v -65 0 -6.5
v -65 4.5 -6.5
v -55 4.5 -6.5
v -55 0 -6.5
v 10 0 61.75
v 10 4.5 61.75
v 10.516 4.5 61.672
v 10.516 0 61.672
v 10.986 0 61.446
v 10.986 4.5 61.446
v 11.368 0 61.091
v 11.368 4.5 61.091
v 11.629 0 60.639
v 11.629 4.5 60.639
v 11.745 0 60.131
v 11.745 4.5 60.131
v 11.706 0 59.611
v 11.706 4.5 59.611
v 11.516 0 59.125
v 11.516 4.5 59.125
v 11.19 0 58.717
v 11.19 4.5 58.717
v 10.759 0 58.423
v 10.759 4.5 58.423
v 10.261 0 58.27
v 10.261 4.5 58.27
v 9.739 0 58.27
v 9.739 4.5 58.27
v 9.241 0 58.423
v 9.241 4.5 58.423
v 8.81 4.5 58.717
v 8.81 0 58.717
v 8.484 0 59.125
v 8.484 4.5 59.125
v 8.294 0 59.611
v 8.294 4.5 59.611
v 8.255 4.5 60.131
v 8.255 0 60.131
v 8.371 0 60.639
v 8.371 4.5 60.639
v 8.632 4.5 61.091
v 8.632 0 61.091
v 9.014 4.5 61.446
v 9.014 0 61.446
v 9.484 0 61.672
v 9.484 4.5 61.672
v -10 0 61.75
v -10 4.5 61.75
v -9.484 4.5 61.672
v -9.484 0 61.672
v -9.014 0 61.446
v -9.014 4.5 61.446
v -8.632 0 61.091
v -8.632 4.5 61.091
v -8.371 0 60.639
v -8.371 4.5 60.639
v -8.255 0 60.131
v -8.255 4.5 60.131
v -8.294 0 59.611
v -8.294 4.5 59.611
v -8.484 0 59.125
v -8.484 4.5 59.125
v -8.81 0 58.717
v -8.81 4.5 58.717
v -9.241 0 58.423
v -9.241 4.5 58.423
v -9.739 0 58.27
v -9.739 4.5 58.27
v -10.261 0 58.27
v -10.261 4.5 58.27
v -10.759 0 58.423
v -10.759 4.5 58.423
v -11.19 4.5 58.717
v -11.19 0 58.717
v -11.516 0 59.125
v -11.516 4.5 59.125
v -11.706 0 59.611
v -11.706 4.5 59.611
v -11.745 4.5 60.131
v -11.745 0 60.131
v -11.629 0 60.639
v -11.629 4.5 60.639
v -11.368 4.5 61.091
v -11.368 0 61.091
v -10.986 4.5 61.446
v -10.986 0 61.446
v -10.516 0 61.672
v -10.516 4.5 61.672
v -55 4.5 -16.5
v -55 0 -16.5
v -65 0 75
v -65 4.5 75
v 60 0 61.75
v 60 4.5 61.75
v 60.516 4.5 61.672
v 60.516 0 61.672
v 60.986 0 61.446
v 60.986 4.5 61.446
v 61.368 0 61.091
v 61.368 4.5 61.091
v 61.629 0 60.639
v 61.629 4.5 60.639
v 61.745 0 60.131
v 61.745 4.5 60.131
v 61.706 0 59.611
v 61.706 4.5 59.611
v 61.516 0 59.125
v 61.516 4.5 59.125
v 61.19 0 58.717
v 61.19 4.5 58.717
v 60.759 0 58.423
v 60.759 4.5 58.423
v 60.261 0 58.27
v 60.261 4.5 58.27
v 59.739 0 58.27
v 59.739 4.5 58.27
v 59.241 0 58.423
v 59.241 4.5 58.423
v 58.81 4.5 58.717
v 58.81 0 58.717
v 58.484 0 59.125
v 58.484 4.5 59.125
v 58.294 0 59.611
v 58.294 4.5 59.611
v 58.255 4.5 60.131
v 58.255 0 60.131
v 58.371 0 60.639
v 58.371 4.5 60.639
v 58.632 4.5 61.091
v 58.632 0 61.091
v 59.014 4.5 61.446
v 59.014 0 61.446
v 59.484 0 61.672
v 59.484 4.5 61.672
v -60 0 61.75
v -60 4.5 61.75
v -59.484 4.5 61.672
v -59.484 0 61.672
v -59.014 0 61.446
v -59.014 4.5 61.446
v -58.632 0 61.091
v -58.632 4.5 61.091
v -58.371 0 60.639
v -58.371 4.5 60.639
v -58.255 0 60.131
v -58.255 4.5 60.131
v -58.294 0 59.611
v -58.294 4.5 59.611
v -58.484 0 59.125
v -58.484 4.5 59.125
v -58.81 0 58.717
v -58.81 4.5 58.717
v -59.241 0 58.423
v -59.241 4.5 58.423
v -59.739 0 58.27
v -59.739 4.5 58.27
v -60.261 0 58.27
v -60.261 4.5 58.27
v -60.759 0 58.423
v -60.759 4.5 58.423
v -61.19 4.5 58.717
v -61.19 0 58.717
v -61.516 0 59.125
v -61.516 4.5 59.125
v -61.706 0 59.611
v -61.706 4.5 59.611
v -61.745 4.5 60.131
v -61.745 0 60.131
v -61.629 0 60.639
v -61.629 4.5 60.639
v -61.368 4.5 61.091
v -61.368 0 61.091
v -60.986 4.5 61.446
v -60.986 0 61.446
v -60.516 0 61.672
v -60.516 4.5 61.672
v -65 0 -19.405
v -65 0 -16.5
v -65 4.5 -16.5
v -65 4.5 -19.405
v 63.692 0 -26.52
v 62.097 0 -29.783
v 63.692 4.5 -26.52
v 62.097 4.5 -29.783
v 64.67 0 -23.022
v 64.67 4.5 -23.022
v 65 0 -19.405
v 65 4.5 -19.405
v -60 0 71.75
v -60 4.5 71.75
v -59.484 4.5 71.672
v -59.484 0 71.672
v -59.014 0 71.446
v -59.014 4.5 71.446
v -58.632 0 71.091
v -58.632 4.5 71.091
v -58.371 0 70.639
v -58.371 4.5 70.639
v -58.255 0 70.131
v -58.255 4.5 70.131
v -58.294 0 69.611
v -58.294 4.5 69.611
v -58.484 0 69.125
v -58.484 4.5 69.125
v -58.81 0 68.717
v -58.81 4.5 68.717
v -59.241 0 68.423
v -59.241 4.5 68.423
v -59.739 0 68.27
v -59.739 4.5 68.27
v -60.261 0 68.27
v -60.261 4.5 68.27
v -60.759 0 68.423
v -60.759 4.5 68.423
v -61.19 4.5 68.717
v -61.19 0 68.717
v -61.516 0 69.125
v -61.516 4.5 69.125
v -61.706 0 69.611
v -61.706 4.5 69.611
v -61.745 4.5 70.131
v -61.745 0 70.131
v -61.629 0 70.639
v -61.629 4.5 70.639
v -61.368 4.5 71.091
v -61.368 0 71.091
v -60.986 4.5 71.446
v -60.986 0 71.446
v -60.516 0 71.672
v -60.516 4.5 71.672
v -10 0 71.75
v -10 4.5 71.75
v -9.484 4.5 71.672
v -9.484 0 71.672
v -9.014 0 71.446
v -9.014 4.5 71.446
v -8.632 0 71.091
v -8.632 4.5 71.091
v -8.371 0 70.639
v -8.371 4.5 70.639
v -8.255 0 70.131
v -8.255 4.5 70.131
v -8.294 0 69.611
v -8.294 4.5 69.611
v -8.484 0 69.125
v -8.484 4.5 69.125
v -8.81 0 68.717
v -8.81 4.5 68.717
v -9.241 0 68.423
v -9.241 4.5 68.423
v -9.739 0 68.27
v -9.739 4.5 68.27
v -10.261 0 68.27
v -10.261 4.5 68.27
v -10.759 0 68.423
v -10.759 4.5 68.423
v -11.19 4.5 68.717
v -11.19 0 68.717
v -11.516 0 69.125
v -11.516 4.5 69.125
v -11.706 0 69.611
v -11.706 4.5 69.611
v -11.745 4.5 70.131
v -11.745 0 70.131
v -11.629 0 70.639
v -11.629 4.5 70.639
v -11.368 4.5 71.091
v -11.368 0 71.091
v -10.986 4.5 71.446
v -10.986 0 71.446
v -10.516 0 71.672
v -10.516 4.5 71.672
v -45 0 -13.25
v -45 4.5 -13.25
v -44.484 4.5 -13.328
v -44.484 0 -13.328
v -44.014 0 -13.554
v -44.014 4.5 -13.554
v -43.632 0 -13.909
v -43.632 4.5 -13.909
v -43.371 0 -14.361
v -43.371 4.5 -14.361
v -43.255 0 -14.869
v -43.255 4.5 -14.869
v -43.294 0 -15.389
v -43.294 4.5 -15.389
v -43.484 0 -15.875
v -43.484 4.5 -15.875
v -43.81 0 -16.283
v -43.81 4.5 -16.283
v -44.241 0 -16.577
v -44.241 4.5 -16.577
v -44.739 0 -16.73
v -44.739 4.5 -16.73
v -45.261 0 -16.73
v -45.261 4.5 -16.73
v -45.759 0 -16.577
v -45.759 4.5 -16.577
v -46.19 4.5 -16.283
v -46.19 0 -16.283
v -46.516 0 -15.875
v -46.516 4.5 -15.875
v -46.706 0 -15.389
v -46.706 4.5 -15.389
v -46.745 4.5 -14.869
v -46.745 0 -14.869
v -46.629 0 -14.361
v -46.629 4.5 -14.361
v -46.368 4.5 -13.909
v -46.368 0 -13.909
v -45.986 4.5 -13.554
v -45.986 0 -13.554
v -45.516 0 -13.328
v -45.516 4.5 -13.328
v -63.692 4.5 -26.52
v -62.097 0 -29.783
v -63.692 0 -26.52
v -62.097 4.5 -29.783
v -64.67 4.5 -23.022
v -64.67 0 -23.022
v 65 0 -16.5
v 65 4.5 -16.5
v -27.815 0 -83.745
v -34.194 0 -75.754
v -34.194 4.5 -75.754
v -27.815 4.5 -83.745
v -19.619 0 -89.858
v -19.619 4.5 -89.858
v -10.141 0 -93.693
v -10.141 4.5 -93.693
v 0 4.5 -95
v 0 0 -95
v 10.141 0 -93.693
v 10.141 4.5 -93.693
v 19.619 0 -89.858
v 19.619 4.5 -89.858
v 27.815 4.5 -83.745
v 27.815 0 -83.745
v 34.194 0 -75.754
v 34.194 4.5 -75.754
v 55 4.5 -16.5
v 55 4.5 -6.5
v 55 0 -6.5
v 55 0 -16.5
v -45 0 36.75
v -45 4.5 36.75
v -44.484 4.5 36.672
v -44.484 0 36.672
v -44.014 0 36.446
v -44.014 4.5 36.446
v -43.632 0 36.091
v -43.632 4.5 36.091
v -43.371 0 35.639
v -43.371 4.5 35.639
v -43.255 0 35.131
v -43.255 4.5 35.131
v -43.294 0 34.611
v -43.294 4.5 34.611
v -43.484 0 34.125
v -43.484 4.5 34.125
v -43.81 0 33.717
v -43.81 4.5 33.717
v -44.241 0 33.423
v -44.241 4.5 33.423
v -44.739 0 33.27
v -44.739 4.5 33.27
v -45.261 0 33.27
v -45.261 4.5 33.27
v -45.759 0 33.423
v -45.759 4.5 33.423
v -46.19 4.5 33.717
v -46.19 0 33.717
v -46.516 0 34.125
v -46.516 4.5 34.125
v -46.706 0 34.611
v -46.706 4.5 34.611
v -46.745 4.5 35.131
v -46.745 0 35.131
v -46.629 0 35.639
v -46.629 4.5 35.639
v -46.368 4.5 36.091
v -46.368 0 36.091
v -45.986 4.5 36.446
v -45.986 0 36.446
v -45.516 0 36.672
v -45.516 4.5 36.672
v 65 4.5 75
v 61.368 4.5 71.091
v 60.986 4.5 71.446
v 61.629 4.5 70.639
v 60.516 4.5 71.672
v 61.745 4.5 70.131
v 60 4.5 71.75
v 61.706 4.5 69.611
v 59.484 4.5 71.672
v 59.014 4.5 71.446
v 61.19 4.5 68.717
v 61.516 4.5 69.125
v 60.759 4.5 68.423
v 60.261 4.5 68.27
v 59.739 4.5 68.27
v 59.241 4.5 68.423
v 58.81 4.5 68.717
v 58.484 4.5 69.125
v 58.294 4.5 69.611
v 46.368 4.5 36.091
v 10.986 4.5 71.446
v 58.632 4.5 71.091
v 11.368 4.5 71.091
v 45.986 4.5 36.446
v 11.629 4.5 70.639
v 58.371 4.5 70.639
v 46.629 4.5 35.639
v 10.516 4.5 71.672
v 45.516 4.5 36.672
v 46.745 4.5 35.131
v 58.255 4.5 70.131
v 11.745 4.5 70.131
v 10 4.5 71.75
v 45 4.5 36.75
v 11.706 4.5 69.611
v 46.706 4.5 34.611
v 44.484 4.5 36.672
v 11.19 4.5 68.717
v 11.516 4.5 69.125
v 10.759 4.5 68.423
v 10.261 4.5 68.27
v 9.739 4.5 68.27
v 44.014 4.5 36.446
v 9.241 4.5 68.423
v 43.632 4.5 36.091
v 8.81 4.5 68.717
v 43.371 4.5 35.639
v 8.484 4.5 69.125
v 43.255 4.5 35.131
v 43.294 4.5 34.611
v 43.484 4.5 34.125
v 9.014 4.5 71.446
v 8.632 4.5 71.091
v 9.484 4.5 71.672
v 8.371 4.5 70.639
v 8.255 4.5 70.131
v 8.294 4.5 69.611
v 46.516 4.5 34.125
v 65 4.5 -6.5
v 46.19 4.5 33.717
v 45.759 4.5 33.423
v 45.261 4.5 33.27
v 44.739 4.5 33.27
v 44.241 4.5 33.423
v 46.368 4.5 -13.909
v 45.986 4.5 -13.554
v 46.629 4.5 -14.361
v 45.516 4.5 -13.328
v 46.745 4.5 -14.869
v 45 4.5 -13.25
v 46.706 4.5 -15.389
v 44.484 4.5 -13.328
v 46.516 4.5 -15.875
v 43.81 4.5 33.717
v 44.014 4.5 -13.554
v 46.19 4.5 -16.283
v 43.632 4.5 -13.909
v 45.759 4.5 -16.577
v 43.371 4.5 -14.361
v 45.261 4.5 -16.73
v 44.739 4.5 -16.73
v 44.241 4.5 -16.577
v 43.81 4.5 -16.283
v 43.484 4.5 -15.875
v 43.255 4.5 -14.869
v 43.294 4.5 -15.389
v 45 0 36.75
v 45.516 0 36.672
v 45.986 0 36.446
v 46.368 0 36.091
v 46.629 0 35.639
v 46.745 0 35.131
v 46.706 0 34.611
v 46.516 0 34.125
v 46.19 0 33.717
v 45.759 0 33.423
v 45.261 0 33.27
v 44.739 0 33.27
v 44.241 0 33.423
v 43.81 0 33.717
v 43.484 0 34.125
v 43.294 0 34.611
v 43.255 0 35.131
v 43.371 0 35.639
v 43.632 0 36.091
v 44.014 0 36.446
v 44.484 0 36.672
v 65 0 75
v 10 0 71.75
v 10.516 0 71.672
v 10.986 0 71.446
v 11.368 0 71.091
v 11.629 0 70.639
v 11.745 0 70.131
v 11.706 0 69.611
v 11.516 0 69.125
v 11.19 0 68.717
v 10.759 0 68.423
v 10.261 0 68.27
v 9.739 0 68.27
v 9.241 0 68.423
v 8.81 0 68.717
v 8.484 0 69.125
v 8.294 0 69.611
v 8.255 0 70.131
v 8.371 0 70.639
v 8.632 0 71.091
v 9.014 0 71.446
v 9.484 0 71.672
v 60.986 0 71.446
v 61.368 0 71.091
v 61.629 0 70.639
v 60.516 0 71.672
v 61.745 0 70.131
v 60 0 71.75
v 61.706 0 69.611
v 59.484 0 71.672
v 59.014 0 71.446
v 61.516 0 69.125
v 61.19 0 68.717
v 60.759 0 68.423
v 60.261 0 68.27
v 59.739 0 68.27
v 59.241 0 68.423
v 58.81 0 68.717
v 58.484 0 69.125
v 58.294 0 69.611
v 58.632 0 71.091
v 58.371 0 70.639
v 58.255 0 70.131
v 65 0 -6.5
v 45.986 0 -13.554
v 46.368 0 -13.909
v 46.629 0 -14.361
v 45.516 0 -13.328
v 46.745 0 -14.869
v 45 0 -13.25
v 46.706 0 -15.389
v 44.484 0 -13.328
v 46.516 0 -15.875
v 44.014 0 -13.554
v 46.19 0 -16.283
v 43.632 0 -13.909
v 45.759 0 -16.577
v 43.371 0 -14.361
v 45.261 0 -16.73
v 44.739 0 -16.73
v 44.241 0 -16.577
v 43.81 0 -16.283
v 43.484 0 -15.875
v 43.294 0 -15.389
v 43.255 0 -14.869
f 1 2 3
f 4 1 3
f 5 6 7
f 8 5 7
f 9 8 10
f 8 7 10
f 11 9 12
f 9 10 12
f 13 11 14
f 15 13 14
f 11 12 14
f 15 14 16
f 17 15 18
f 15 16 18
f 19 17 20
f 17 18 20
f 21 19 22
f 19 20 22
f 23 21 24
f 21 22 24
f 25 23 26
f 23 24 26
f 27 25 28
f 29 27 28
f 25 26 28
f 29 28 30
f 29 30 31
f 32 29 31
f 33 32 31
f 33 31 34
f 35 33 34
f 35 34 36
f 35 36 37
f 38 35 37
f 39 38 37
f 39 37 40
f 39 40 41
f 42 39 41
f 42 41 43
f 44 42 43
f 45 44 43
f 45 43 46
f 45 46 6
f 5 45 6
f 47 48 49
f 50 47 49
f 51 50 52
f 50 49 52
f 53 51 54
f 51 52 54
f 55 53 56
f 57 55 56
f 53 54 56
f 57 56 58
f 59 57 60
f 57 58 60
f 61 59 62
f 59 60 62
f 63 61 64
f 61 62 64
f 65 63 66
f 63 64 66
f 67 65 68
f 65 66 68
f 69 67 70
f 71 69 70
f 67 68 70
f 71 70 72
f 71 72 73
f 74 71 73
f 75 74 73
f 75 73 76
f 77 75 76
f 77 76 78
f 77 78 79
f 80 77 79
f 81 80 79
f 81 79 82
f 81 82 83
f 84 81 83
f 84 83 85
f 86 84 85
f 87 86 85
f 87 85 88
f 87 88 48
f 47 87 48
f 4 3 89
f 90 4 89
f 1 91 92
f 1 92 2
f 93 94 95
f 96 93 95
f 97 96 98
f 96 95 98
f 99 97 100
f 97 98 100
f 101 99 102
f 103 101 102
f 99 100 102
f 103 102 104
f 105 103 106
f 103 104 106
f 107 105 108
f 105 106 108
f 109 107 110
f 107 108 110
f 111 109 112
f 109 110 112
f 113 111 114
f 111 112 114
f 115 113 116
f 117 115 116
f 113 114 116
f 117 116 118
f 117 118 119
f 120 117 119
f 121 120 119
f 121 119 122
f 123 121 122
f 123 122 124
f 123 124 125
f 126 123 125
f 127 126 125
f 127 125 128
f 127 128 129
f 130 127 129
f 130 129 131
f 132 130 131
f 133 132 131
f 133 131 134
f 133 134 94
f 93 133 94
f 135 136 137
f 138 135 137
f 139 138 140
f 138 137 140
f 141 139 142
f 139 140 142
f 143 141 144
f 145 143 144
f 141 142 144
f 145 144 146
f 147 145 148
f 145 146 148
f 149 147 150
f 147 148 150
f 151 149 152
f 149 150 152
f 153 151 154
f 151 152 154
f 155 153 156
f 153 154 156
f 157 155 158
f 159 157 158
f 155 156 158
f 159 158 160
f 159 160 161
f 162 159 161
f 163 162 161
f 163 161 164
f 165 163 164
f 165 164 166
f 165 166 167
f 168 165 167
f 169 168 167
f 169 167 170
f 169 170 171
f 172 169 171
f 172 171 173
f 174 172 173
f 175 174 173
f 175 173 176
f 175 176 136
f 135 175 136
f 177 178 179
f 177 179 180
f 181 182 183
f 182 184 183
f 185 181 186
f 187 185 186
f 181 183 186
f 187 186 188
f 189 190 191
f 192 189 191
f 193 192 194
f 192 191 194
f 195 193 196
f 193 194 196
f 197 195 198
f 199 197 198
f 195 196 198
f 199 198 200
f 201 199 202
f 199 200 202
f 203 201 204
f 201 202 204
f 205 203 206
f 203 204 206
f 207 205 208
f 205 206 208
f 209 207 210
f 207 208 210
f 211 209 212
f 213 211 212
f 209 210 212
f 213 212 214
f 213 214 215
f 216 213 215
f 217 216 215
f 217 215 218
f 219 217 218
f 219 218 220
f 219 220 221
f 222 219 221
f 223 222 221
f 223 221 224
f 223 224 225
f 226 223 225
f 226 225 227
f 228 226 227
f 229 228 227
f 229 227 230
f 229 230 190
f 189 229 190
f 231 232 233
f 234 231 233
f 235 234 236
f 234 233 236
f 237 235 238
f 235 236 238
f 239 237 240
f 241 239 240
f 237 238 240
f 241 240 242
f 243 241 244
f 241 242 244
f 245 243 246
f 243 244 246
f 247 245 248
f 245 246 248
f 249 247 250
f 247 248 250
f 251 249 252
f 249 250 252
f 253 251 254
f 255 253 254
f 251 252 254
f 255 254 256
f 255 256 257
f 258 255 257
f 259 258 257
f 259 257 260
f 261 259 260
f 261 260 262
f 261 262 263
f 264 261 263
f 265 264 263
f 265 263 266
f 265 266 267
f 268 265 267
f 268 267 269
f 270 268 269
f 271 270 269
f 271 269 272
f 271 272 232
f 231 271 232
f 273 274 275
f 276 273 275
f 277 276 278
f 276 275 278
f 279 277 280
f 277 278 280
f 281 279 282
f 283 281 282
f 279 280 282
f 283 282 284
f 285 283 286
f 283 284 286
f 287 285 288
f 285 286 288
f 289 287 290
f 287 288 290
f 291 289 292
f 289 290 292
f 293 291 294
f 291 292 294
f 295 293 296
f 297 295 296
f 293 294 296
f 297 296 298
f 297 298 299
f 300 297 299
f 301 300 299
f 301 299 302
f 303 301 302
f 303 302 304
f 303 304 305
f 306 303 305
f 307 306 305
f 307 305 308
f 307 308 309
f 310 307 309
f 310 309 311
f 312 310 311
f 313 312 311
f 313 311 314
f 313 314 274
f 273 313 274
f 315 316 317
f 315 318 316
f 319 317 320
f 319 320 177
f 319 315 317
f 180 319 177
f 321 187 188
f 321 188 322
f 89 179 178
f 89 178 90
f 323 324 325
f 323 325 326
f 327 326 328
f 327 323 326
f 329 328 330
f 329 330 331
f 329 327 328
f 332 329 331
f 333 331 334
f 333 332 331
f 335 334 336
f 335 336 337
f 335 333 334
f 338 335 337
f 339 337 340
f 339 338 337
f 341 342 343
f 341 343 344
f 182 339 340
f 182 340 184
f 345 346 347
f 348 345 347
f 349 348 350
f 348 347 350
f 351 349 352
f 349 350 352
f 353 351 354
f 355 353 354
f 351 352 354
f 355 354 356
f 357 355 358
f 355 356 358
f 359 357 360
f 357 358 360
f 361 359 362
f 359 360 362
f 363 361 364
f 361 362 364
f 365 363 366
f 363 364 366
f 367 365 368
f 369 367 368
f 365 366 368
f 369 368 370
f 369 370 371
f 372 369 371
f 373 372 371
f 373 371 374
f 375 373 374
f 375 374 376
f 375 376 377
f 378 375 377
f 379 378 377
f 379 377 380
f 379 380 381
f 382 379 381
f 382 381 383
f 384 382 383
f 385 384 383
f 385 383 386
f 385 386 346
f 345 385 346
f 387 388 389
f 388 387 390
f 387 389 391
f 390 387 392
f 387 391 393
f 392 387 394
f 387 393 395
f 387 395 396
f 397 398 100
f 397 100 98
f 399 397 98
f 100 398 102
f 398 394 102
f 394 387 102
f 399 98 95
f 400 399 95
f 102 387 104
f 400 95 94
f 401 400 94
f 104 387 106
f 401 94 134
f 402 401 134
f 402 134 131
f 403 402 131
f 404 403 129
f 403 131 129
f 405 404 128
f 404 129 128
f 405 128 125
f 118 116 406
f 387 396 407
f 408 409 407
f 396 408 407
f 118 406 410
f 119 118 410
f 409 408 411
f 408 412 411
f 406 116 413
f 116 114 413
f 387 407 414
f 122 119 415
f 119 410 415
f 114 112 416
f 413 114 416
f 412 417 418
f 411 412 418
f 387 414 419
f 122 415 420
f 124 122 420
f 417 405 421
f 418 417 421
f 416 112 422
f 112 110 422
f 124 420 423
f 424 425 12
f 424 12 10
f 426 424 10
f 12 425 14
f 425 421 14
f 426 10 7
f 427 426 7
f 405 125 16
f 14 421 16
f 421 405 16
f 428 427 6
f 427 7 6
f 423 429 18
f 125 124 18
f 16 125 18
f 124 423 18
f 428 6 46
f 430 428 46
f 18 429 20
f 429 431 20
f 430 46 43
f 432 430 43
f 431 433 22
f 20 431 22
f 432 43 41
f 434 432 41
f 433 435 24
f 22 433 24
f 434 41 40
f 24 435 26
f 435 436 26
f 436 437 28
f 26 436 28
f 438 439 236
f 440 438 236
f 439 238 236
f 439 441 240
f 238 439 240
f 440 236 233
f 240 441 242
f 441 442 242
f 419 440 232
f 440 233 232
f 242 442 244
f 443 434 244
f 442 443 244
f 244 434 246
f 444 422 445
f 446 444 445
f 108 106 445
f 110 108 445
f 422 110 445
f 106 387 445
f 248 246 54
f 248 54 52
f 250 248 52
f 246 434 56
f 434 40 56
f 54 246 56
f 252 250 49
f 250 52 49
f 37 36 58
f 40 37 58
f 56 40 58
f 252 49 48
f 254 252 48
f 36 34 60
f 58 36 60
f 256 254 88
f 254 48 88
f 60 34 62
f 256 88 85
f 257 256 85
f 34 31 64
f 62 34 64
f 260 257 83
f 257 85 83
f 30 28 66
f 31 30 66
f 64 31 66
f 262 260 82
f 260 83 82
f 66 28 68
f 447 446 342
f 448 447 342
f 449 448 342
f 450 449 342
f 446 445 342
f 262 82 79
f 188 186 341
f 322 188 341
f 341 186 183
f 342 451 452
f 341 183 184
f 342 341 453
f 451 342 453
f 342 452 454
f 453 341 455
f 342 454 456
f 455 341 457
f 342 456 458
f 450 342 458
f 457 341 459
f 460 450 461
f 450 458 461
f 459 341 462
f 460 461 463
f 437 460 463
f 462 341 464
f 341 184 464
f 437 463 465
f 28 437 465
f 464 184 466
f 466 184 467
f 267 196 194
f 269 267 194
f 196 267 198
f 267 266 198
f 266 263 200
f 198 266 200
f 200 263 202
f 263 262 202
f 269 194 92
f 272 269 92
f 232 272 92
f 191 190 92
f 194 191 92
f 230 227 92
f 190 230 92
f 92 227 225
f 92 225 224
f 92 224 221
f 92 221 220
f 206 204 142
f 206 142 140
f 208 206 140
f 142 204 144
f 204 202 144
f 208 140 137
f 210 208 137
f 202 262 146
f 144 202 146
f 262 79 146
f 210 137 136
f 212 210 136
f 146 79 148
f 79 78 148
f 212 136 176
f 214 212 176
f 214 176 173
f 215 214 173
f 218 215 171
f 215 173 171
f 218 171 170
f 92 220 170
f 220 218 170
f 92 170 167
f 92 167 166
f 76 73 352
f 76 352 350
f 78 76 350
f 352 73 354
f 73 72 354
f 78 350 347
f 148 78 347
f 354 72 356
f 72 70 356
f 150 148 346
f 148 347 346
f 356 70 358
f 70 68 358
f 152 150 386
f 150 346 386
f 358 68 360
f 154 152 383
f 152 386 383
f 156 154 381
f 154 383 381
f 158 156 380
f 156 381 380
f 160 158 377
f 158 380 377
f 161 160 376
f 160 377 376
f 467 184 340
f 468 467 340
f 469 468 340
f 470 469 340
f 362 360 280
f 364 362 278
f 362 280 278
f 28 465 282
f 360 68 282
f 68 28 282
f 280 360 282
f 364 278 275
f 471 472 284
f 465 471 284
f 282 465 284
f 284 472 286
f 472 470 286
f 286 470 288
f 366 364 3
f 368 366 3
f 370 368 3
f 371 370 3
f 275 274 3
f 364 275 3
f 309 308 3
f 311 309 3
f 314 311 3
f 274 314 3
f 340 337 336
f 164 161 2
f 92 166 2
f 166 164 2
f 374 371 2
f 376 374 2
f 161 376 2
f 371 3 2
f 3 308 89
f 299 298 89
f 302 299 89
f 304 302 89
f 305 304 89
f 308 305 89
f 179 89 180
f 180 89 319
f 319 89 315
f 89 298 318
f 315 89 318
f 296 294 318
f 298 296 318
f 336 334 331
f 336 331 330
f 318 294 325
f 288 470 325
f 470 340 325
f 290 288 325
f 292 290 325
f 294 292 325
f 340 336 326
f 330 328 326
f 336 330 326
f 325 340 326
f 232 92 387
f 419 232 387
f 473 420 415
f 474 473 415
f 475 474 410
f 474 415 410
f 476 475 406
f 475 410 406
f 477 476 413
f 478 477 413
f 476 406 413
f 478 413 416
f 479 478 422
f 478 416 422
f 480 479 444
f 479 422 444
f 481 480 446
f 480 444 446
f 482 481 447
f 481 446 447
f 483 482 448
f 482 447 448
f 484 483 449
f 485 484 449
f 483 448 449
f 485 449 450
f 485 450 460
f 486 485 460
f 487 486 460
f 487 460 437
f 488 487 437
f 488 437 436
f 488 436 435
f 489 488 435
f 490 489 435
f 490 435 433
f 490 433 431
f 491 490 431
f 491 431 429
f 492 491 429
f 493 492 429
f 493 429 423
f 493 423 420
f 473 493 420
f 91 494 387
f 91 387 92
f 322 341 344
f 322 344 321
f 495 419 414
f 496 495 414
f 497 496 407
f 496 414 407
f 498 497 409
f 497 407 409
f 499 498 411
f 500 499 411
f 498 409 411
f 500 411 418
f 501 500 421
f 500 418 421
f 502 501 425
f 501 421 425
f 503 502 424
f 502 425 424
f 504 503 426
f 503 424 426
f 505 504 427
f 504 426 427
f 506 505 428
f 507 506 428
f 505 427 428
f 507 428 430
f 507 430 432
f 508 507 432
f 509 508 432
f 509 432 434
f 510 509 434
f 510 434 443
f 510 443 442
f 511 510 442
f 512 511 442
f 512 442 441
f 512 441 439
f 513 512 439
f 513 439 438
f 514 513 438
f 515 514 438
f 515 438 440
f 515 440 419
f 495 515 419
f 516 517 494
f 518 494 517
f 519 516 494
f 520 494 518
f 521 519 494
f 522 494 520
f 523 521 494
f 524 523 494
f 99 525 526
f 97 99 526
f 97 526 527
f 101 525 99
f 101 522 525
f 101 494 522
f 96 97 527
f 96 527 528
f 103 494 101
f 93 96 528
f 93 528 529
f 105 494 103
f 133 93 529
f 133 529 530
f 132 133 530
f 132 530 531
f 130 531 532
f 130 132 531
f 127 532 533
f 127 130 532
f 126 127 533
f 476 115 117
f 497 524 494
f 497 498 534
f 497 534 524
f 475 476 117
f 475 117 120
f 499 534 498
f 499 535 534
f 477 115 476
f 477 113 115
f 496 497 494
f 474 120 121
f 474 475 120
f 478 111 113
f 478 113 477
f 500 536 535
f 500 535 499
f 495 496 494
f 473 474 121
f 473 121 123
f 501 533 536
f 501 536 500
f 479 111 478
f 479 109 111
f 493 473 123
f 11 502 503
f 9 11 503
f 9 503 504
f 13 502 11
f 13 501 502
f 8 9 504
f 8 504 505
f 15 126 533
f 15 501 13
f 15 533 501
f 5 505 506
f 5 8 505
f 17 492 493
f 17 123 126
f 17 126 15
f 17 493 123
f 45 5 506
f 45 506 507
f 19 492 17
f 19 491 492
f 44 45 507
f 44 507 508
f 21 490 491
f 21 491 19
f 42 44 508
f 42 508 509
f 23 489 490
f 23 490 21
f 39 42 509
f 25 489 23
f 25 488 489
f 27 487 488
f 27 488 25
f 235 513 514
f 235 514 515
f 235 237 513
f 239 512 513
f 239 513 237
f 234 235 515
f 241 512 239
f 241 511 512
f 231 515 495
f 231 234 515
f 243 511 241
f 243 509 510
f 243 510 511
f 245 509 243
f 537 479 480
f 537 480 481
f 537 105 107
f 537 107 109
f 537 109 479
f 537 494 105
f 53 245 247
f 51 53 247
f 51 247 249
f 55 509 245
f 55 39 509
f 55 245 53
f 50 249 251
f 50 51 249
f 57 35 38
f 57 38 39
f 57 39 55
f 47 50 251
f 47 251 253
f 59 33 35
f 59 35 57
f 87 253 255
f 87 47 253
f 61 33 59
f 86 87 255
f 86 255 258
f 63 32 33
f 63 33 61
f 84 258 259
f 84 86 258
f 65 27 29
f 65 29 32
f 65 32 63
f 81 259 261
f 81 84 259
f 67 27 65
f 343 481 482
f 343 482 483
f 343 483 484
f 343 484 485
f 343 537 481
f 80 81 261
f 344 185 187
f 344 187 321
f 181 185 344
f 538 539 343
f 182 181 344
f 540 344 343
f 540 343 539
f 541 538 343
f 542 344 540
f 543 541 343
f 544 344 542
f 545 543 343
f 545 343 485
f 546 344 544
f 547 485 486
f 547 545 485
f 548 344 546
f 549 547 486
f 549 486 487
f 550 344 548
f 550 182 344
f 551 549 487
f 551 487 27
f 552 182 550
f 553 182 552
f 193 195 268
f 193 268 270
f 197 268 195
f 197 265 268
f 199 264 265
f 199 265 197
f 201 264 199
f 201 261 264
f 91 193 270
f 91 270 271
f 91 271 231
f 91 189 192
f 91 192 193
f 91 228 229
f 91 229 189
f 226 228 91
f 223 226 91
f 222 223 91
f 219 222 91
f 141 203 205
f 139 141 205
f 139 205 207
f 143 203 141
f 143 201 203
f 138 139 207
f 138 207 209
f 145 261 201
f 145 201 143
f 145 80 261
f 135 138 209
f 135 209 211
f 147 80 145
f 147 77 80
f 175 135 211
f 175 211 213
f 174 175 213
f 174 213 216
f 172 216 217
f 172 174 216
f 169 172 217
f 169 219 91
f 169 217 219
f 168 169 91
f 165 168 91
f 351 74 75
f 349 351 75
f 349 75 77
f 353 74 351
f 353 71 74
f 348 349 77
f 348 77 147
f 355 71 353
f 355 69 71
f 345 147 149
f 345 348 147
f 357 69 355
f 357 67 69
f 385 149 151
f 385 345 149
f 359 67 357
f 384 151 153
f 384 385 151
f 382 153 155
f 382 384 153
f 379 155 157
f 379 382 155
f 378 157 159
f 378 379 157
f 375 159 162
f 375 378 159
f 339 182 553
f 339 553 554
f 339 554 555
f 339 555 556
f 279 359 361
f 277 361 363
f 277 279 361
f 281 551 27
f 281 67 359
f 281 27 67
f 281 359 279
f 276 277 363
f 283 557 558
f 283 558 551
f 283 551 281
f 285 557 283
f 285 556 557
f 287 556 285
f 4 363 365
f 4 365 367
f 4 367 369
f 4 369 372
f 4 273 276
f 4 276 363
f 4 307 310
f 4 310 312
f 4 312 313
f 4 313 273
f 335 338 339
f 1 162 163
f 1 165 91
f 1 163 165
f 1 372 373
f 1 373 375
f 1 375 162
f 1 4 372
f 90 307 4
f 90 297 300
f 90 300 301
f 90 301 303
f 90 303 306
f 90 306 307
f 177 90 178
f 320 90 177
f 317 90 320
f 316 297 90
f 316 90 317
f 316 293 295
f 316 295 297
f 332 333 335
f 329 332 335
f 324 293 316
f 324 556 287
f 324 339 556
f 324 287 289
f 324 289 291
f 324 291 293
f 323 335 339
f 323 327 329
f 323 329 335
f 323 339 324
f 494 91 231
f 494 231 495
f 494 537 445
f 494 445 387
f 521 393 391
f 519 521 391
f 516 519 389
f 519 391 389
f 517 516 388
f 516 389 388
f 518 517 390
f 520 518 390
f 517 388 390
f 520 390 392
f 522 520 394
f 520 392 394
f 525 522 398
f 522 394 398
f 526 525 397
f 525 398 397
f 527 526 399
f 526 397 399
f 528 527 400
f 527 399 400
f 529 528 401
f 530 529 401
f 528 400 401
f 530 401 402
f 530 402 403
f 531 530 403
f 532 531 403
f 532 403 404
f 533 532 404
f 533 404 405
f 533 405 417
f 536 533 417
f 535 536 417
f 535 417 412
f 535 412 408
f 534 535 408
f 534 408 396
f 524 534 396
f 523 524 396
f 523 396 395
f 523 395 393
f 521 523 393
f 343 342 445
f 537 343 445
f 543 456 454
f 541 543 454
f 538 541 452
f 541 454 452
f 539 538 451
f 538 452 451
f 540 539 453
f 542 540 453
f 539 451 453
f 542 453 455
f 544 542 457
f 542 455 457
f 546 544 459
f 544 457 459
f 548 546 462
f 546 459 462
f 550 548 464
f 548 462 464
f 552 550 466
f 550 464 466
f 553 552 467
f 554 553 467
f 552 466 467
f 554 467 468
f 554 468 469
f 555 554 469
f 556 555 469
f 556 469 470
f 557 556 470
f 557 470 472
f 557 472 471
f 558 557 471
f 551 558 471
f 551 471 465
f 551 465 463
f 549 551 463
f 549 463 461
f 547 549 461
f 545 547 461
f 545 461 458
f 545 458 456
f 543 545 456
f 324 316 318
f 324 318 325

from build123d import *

# Parameters (mm, degrees)
EXTRUDE_1_DEPTH     = 4.5
FILLET_1_R          = 20
SKETCH_2_W          = 10
SKETCH_2_H          = 10
CUT_EXTRUDE_1_DEPTH = 116.19657113
SKETCH_3_R          = 1.75
CUT_EXTRUDE_2_DEPTH = 116.19657113


with BuildPart() as part:
    # 스케치1 → 보스-돌출1 (new body)
    with BuildSketch(Plane(origin=(0, 0, 0), x_dir=(1, 0, 0), z_dir=(0, 1, 0))):
        with BuildLine():
            Line((-65, 25), (-34.194351712, 75.754428709))
            ThreePointArc((-34.194351712, 75.754428709), (0, 95), (34.194351712, 75.754428709))
            Line((34.194351712, 75.754428709), (65, 25))
            Line((65, 25), (65, -75))
            Line((65, -75), (-65, -75))
            Line((-65, -75), (-65, 25))
        make_face()
    extrude(amount=EXTRUDE_1_DEPTH)

    # 필렛1
    fillet_1_edges = [part.edges().sort_by_distance(p)[0] for p in [
        (-65, 2.25, -25),
        (65, 2.25, -25),
    ]]
    fillet(fillet_1_edges, radius=FILLET_1_R)

    # 스케치2 → 컷-돌출1 (cut, through all)
    with BuildSketch(Plane(origin=(0, 4.5, 0), x_dir=(1, 0, 0), z_dir=(0, 1, 0))):
        with Locations((-60, 11.5)):
            Rectangle(SKETCH_2_W, SKETCH_2_H)
        with Locations((60, 11.5)):
            Rectangle(SKETCH_2_W, SKETCH_2_H)
    extrude(amount=-CUT_EXTRUDE_1_DEPTH, mode=Mode.SUBTRACT)

    # 스케치3 → 컷-돌출2 (cut, through all)
    with BuildSketch(Plane(origin=(0, 4.5, 0), x_dir=(1, 0, 0), z_dir=(0, 1, 0))):
        with Locations(Location((-60, -60, 0), (0, 0, 270))):
            Circle(SKETCH_3_R)
        with Locations(Location((-60, -70, 0), (0, 0, 270))):
            Circle(SKETCH_3_R)
        with Locations(Location((60, -60, 0), (0, 0, 270))):
            Circle(SKETCH_3_R)
        with Locations(Location((60, -70, 0), (0, 0, 270))):
            Circle(SKETCH_3_R)
        with Locations(Location((-10, -60, 0), (0, 0, 270))):
            Circle(SKETCH_3_R)
        with Locations(Location((10, -60, 0), (0, 0, 270))):
            Circle(SKETCH_3_R)
        with Locations(Location((-10, -70, 0), (0, 0, 270))):
            Circle(SKETCH_3_R)
        with Locations(Location((10, -70, 0), (0, 0, 270))):
            Circle(SKETCH_3_R)
        with Locations(Location((-45, 15, 0), (0, 0, 270))):
            Circle(SKETCH_3_R)
        with Locations(Location((45, 15, 0), (0, 0, 270))):
            Circle(SKETCH_3_R)
        with Locations(Location((-45, -35, 0), (0, 0, 270))):
            Circle(SKETCH_3_R)
        with Locations(Location((45, -35, 0), (0, 0, 270))):
            Circle(SKETCH_3_R)
    extrude(amount=-CUT_EXTRUDE_2_DEPTH, mode=Mode.SUBTRACT)


solid = part.part
